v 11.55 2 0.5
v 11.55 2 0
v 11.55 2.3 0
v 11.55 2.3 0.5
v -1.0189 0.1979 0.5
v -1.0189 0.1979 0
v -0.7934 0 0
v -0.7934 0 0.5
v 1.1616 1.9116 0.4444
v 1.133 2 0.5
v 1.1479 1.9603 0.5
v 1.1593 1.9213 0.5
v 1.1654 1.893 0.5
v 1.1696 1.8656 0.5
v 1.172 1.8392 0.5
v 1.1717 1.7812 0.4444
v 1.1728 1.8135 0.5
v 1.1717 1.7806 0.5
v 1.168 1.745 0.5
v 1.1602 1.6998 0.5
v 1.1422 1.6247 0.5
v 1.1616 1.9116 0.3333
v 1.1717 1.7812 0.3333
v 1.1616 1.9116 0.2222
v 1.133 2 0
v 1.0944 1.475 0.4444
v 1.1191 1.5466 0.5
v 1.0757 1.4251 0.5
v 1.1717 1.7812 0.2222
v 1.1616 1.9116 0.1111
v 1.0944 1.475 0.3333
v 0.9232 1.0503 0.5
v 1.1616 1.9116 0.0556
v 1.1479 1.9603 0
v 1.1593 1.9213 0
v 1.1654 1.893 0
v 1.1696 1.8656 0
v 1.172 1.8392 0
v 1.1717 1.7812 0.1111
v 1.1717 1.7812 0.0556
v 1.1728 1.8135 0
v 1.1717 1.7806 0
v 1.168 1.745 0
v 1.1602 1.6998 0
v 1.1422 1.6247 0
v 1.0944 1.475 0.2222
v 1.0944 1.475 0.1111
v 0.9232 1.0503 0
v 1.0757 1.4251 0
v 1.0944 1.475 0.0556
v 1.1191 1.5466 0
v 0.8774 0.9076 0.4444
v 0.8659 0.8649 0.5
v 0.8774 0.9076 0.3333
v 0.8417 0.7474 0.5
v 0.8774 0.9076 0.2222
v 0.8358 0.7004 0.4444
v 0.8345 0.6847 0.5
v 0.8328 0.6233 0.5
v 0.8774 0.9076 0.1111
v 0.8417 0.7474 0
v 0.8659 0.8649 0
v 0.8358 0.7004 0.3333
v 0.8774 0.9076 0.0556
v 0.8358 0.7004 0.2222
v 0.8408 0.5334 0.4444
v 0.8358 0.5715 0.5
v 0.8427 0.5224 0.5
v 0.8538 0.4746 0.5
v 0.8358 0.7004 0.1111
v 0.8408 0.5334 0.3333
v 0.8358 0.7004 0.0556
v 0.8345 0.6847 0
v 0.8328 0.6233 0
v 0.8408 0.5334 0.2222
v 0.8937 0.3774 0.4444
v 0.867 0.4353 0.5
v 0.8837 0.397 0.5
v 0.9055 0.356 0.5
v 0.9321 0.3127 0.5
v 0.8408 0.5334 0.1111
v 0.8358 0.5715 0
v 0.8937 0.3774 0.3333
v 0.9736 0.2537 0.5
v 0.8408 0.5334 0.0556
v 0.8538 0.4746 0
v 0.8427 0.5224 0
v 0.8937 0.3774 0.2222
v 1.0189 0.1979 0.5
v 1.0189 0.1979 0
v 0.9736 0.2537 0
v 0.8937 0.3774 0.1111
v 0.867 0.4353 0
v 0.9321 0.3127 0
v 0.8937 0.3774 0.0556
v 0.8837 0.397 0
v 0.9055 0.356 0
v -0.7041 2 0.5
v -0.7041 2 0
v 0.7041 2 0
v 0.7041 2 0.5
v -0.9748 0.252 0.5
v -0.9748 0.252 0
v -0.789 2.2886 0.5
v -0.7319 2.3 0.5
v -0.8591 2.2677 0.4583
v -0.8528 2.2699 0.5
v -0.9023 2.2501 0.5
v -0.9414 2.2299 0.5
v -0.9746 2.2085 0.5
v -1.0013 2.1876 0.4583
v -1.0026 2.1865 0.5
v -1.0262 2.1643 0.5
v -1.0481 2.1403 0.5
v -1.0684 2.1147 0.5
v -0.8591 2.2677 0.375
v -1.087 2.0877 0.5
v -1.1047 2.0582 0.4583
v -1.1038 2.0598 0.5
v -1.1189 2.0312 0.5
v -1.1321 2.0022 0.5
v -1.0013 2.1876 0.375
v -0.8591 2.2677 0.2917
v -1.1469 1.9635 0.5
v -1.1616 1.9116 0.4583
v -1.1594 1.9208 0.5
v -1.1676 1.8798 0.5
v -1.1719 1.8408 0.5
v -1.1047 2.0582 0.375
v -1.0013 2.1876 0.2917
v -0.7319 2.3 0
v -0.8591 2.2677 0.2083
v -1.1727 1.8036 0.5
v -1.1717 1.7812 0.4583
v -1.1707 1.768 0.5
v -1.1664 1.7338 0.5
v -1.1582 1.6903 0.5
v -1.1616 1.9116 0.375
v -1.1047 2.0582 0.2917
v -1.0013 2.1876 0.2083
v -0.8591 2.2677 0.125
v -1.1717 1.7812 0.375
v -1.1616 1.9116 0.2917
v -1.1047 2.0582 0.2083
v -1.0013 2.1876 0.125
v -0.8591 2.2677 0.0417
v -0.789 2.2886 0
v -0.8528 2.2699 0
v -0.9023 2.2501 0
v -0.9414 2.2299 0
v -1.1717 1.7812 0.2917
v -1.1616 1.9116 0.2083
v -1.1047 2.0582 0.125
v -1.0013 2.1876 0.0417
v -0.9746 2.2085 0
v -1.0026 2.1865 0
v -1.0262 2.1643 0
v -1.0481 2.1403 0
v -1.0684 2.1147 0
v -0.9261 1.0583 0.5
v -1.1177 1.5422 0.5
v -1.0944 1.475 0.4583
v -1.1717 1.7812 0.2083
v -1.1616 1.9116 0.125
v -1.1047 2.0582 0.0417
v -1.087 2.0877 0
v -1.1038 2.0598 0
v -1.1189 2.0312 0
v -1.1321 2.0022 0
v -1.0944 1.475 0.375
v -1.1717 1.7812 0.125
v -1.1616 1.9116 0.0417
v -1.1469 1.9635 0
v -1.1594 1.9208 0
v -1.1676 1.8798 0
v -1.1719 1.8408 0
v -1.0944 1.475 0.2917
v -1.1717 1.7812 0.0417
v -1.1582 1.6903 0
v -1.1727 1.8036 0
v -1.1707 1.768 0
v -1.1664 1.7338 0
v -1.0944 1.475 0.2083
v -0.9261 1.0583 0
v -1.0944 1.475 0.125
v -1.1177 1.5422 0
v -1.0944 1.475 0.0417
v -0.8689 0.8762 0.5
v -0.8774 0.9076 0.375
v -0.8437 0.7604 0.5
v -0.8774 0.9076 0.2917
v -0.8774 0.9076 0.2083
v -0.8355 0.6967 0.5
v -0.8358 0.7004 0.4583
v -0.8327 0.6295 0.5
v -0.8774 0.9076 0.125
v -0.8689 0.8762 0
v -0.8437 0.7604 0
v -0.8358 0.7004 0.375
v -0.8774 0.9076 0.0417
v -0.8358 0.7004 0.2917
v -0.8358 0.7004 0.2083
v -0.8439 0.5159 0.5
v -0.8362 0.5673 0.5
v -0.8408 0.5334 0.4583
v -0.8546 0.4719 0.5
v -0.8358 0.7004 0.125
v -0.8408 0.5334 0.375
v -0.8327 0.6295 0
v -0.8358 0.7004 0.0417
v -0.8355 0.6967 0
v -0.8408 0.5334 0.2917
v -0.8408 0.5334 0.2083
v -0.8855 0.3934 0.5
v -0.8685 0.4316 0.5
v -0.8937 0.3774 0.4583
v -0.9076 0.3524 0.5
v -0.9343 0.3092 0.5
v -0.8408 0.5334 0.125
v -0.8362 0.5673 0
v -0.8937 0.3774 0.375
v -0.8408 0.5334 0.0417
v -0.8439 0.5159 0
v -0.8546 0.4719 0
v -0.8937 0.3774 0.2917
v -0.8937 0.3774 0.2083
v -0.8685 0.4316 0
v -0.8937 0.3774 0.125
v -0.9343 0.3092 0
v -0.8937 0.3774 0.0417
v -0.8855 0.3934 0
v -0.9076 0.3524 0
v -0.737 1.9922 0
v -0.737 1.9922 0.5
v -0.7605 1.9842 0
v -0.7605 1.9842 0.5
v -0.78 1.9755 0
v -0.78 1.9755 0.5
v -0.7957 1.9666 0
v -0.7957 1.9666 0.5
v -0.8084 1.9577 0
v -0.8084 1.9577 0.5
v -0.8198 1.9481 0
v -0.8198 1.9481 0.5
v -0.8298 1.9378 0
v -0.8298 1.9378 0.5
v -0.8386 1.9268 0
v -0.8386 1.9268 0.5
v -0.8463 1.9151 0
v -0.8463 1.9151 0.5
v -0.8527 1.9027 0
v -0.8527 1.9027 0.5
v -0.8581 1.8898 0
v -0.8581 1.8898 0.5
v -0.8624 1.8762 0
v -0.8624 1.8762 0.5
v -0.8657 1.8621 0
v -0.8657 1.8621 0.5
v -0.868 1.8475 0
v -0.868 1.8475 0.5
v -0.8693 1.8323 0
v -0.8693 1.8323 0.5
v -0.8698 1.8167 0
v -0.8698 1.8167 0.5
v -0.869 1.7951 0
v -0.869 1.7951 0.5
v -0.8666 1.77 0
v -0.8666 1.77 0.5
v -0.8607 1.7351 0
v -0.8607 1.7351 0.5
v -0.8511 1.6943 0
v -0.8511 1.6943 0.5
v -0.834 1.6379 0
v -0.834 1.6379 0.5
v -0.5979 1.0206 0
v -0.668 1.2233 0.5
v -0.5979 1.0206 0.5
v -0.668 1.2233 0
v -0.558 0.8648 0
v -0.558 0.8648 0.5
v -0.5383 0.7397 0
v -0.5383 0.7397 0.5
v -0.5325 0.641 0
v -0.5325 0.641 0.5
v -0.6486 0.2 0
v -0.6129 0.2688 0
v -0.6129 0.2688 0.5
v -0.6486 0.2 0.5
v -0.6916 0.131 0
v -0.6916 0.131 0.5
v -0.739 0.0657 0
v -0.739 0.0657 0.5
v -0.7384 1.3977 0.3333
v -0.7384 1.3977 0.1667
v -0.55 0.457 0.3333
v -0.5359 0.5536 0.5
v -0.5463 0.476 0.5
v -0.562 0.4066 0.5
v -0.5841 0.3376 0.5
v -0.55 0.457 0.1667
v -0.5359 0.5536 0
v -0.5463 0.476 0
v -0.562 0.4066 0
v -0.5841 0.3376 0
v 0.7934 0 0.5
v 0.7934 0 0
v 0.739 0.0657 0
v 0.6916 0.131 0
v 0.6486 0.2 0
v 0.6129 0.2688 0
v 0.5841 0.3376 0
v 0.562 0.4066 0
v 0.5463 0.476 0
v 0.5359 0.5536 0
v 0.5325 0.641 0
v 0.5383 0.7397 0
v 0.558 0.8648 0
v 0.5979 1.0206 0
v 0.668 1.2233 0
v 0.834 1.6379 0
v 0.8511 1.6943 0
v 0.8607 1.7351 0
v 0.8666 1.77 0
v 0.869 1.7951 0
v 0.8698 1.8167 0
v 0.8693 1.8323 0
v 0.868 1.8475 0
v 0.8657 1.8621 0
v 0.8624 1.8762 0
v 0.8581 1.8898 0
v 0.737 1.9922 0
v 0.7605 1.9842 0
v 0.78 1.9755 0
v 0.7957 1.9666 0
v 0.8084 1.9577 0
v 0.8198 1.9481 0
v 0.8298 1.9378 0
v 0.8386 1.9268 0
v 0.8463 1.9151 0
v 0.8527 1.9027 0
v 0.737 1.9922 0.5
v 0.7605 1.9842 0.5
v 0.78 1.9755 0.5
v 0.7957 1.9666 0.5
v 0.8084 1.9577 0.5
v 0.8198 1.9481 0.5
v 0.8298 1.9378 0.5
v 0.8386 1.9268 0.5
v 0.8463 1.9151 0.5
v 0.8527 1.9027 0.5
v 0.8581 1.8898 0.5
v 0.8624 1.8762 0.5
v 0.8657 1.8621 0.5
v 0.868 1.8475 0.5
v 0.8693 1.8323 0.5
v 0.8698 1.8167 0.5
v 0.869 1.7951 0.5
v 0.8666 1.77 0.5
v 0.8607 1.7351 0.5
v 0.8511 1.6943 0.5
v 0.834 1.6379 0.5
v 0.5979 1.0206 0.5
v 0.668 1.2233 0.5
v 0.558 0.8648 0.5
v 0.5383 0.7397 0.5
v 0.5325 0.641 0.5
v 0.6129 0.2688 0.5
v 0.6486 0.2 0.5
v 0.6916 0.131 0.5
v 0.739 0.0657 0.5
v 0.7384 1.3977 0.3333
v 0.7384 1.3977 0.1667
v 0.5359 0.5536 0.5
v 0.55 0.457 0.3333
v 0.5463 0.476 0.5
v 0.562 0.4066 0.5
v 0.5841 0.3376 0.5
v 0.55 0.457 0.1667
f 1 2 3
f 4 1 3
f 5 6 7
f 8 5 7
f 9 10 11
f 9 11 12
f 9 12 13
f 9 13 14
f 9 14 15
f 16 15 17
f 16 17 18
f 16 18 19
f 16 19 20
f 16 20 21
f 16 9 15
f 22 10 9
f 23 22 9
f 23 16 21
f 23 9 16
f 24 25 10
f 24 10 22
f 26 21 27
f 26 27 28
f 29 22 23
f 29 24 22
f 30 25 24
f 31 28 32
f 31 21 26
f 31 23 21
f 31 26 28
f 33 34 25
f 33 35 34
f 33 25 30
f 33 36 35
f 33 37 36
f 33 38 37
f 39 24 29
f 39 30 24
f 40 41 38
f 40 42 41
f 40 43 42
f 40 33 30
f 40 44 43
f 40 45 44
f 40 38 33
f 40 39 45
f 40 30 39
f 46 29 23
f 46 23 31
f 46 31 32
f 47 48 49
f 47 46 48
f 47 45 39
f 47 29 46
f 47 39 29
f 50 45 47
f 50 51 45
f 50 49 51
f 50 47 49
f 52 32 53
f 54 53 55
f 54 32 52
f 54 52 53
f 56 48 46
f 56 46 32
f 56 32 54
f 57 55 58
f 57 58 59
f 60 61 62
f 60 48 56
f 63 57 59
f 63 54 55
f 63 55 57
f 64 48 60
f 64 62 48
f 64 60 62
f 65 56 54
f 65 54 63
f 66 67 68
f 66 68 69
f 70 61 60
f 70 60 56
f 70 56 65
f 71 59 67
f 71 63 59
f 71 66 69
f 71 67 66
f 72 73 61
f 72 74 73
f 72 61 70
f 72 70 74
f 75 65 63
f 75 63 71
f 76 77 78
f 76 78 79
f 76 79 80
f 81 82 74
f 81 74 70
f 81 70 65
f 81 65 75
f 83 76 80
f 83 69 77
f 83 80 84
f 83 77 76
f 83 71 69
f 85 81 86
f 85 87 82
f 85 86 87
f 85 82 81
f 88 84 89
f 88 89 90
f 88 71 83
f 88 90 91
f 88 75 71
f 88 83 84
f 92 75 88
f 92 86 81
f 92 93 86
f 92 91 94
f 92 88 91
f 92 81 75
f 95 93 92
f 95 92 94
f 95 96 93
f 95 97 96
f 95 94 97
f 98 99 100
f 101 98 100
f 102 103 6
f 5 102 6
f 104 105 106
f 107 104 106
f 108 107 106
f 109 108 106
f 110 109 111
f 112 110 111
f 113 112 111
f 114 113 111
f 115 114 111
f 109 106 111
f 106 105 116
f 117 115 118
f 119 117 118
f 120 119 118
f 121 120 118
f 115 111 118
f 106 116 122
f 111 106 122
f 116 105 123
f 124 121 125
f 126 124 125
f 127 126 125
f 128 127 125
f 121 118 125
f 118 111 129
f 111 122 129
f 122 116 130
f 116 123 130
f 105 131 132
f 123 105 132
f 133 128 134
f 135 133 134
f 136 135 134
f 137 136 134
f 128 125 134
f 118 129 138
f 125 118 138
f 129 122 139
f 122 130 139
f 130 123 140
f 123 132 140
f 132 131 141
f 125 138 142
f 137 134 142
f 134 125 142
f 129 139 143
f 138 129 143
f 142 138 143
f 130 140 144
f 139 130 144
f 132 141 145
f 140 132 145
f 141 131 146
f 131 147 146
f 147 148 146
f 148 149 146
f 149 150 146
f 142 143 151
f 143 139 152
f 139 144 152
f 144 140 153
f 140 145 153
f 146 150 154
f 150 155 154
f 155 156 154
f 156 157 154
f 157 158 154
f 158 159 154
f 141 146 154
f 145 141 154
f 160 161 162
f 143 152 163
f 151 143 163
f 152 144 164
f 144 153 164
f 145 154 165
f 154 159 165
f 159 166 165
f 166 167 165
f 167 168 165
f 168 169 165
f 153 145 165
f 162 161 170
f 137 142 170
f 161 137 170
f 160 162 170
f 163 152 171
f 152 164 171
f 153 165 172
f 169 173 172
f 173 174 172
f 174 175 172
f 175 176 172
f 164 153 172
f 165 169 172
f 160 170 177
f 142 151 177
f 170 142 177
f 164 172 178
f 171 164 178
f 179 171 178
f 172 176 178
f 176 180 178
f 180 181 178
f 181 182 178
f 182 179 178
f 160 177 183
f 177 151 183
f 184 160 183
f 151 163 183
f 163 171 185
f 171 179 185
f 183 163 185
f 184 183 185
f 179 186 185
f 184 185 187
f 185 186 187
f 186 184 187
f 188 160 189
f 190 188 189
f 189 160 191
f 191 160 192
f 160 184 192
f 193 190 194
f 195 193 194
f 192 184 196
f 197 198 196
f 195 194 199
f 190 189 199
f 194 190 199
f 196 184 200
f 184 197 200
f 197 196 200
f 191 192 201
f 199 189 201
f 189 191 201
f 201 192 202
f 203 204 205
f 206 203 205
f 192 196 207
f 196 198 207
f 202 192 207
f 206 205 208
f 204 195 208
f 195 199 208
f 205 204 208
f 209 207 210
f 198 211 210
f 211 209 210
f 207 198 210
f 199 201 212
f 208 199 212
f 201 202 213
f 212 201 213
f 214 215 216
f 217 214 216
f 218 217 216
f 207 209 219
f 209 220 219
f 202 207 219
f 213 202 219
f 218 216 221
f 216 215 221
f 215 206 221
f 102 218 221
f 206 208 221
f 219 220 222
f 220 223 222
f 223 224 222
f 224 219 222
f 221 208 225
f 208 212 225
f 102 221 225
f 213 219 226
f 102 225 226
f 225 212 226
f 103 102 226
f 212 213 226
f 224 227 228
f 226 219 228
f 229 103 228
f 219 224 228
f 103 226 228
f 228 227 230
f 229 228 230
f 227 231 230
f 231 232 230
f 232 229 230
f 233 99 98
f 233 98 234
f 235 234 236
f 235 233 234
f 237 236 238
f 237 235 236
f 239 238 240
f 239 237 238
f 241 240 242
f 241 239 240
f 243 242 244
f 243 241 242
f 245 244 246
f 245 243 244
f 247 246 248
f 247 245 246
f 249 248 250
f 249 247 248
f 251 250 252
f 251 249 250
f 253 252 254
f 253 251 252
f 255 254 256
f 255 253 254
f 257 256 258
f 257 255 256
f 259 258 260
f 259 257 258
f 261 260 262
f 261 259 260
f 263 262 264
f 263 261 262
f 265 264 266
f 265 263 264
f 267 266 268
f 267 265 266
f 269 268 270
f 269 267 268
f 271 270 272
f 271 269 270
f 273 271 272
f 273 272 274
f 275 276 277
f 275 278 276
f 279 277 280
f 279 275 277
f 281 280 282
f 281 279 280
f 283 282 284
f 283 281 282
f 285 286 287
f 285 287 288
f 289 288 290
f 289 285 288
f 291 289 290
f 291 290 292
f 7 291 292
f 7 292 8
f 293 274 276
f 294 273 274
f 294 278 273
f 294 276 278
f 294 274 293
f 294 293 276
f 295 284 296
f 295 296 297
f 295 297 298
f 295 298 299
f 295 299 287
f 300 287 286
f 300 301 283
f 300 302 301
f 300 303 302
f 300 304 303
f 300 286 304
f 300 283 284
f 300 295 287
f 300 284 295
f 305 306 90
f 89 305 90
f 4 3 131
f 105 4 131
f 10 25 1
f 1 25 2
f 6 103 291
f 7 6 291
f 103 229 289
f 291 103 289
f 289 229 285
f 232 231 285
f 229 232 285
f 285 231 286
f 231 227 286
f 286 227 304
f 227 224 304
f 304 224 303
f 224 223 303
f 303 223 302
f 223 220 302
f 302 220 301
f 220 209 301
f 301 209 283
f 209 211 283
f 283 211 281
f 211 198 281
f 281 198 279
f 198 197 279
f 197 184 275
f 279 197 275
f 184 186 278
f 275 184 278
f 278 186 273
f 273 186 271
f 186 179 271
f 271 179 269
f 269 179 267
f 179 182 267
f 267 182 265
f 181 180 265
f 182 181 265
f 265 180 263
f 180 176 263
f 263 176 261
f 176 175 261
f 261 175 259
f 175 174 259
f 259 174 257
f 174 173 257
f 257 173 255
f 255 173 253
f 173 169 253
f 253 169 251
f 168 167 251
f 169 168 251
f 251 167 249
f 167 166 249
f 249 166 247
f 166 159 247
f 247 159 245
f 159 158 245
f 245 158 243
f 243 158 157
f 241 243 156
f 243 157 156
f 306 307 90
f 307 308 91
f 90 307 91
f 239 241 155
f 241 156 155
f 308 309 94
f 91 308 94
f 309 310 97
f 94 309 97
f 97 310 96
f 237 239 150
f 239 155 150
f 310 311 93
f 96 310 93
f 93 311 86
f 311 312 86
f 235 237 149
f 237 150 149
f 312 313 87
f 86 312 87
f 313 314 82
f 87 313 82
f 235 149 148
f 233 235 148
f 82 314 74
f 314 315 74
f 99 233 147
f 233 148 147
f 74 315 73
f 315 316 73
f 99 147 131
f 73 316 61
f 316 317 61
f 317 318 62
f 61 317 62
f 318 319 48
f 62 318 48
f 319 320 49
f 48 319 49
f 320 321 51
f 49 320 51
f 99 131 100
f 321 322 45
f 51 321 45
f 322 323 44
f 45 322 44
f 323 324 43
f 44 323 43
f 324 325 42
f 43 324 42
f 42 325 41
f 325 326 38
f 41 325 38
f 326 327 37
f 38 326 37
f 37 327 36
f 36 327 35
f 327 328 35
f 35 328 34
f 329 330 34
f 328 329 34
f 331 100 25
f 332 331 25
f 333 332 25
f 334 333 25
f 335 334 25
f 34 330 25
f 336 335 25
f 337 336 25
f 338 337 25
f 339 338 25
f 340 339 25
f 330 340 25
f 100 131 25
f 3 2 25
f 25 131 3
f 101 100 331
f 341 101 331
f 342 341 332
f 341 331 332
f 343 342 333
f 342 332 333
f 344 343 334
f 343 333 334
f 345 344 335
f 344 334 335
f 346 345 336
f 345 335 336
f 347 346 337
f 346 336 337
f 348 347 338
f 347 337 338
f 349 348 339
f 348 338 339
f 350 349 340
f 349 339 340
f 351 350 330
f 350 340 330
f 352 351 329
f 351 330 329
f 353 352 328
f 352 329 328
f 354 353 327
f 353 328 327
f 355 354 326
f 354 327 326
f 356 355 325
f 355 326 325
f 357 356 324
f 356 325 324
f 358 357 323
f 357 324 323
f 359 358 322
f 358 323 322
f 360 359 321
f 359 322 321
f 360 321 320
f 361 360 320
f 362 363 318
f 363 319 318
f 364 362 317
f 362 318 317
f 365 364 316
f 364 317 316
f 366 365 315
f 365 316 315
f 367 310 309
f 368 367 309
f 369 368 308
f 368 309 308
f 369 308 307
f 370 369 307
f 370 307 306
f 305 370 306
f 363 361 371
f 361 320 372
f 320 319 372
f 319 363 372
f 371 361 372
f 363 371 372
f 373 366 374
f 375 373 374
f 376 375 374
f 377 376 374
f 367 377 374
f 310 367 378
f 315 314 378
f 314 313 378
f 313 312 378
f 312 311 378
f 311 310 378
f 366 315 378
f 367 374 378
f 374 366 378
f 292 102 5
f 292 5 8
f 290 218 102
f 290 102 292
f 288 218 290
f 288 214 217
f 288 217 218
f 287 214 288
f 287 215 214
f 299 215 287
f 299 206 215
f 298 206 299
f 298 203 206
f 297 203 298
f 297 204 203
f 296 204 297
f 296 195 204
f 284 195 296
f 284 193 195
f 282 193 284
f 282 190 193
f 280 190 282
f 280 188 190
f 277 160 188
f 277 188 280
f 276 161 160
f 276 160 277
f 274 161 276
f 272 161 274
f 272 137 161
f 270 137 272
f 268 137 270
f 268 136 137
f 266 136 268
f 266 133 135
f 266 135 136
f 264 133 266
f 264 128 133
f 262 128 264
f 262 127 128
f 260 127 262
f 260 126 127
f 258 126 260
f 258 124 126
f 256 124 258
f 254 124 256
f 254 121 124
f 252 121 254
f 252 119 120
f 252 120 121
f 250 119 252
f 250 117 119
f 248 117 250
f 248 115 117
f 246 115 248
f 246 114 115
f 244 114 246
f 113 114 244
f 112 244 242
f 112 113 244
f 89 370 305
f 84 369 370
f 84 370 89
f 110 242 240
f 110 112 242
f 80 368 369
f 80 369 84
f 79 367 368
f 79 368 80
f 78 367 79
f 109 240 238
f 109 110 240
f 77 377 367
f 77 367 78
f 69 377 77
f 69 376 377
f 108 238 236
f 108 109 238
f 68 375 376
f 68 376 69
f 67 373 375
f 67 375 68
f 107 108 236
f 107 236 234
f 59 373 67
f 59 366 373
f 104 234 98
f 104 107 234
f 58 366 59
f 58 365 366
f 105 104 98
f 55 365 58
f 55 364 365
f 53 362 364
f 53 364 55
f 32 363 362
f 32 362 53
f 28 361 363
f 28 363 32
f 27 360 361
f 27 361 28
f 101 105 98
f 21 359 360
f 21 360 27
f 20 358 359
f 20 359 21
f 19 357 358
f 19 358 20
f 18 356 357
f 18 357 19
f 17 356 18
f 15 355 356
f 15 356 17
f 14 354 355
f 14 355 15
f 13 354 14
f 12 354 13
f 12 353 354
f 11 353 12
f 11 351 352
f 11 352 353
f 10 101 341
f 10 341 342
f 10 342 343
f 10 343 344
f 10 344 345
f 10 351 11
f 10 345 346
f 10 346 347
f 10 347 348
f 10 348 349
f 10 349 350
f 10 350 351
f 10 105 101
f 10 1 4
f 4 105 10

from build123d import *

# Parameters (mm, degrees)
BOSS_EXTRUDE1_DEPTH = 0.5


with BuildPart() as part:
    # Sketch1 → Boss-Extrude1 (new body)
    with BuildSketch(Plane.XY):
        with BuildLine():
            Line((-0.704103555, 2), (-0.55, 2))
            Line((-0.55, 2), (0.55, 2))
            Line((0.55, 2), (0.704103555, 2))
            add(Edge.make_bspline(
                [(0.704103555, 2), (0.984913182, 1.947600865), (0.653467277, 1.246091392), (0.440470999, 0.580993389), (0.657699293, 0.154588797), (0.793373681, 0)],
                knots=[0, 0, 0, 0, 0.316390632, 0.760407921, 1, 1, 1, 1], degree=3))
            Line((0.793373681, 0), (1.018850663, 0.197889189))
            add(Edge.make_bspline(
                [(1.133013434, 2), (1.145549027, 1.970086767), (1.186864012, 1.840956756), (1.15703676, 1.660917539), (1.074895189, 1.407428806), (0.957177151, 1.153930424), (0.869904633, 0.899603608), (0.827560013, 0.69321454), (0.834928932, 0.530060955), (0.877453, 0.38720653), (0.970734517, 0.252713221), (1.018850663, 0.197889189)],
                knots=[0.09695354, 0.09695354, 0.09695354, 0.09695354, 0.116035266, 0.179175604, 0.242315942, 0.368596619, 0.494877295, 0.621157971, 0.747438647, 0.873719324, 1, 1, 1, 1], degree=3))
            Line((1.133013434, 2), (11.55, 2))
            Line((11.55, 2), (11.55, 2.3))
            Line((11.55, 2.3), (0.55, 2.3))
            Line((0.55, 2.3), (-0.55, 2.3))
            Line((-0.55, 2.3), (-0.731854087, 2.3))
            add(Edge.make_bspline(
                [(-0.731854087, 2.3), (-0.749651334, 2.29667903), (-0.778982171, 2.292180164), (-0.886968809, 2.261943836), (-1.056729579, 2.171508628), (-1.195904507, 1.895525735), (-1.157036764, 1.660917538), (-1.074895193, 1.407428806), (-0.957177154, 1.153930424), (-0.869904635, 0.899603608), (-0.827560014, 0.693214541), (-0.834928933, 0.530060955), (-0.877453, 0.387206531), (-0.970734517, 0.252713221), (-1.018850663, 0.197889189)],
                knots=[-0.01024541, -0.01024541, -0.01024541, -0.01024541, 0.005539674, 0.021324759, 0.052894928, 0.116035266, 0.179175604, 0.242315942, 0.368596619, 0.494877295, 0.621157971, 0.747438647, 0.873719324, 1, 1, 1, 1], degree=3))
            Line((-1.018850663, 0.197889189), (-0.793373681, 0))
            add(Edge.make_bspline(
                [(-0.704103555, 2), (-0.984913182, 1.947600865), (-0.653467277, 1.246091392), (-0.440470999, 0.580993389), (-0.657699293, 0.154588797), (-0.793373681, 0)],
                knots=[0, 0, 0, 0, 0.316390632, 0.760407921, 1, 1, 1, 1], degree=3))
        make_face()
    extrude(amount=BOSS_EXTRUDE1_DEPTH)


solid = part.part
